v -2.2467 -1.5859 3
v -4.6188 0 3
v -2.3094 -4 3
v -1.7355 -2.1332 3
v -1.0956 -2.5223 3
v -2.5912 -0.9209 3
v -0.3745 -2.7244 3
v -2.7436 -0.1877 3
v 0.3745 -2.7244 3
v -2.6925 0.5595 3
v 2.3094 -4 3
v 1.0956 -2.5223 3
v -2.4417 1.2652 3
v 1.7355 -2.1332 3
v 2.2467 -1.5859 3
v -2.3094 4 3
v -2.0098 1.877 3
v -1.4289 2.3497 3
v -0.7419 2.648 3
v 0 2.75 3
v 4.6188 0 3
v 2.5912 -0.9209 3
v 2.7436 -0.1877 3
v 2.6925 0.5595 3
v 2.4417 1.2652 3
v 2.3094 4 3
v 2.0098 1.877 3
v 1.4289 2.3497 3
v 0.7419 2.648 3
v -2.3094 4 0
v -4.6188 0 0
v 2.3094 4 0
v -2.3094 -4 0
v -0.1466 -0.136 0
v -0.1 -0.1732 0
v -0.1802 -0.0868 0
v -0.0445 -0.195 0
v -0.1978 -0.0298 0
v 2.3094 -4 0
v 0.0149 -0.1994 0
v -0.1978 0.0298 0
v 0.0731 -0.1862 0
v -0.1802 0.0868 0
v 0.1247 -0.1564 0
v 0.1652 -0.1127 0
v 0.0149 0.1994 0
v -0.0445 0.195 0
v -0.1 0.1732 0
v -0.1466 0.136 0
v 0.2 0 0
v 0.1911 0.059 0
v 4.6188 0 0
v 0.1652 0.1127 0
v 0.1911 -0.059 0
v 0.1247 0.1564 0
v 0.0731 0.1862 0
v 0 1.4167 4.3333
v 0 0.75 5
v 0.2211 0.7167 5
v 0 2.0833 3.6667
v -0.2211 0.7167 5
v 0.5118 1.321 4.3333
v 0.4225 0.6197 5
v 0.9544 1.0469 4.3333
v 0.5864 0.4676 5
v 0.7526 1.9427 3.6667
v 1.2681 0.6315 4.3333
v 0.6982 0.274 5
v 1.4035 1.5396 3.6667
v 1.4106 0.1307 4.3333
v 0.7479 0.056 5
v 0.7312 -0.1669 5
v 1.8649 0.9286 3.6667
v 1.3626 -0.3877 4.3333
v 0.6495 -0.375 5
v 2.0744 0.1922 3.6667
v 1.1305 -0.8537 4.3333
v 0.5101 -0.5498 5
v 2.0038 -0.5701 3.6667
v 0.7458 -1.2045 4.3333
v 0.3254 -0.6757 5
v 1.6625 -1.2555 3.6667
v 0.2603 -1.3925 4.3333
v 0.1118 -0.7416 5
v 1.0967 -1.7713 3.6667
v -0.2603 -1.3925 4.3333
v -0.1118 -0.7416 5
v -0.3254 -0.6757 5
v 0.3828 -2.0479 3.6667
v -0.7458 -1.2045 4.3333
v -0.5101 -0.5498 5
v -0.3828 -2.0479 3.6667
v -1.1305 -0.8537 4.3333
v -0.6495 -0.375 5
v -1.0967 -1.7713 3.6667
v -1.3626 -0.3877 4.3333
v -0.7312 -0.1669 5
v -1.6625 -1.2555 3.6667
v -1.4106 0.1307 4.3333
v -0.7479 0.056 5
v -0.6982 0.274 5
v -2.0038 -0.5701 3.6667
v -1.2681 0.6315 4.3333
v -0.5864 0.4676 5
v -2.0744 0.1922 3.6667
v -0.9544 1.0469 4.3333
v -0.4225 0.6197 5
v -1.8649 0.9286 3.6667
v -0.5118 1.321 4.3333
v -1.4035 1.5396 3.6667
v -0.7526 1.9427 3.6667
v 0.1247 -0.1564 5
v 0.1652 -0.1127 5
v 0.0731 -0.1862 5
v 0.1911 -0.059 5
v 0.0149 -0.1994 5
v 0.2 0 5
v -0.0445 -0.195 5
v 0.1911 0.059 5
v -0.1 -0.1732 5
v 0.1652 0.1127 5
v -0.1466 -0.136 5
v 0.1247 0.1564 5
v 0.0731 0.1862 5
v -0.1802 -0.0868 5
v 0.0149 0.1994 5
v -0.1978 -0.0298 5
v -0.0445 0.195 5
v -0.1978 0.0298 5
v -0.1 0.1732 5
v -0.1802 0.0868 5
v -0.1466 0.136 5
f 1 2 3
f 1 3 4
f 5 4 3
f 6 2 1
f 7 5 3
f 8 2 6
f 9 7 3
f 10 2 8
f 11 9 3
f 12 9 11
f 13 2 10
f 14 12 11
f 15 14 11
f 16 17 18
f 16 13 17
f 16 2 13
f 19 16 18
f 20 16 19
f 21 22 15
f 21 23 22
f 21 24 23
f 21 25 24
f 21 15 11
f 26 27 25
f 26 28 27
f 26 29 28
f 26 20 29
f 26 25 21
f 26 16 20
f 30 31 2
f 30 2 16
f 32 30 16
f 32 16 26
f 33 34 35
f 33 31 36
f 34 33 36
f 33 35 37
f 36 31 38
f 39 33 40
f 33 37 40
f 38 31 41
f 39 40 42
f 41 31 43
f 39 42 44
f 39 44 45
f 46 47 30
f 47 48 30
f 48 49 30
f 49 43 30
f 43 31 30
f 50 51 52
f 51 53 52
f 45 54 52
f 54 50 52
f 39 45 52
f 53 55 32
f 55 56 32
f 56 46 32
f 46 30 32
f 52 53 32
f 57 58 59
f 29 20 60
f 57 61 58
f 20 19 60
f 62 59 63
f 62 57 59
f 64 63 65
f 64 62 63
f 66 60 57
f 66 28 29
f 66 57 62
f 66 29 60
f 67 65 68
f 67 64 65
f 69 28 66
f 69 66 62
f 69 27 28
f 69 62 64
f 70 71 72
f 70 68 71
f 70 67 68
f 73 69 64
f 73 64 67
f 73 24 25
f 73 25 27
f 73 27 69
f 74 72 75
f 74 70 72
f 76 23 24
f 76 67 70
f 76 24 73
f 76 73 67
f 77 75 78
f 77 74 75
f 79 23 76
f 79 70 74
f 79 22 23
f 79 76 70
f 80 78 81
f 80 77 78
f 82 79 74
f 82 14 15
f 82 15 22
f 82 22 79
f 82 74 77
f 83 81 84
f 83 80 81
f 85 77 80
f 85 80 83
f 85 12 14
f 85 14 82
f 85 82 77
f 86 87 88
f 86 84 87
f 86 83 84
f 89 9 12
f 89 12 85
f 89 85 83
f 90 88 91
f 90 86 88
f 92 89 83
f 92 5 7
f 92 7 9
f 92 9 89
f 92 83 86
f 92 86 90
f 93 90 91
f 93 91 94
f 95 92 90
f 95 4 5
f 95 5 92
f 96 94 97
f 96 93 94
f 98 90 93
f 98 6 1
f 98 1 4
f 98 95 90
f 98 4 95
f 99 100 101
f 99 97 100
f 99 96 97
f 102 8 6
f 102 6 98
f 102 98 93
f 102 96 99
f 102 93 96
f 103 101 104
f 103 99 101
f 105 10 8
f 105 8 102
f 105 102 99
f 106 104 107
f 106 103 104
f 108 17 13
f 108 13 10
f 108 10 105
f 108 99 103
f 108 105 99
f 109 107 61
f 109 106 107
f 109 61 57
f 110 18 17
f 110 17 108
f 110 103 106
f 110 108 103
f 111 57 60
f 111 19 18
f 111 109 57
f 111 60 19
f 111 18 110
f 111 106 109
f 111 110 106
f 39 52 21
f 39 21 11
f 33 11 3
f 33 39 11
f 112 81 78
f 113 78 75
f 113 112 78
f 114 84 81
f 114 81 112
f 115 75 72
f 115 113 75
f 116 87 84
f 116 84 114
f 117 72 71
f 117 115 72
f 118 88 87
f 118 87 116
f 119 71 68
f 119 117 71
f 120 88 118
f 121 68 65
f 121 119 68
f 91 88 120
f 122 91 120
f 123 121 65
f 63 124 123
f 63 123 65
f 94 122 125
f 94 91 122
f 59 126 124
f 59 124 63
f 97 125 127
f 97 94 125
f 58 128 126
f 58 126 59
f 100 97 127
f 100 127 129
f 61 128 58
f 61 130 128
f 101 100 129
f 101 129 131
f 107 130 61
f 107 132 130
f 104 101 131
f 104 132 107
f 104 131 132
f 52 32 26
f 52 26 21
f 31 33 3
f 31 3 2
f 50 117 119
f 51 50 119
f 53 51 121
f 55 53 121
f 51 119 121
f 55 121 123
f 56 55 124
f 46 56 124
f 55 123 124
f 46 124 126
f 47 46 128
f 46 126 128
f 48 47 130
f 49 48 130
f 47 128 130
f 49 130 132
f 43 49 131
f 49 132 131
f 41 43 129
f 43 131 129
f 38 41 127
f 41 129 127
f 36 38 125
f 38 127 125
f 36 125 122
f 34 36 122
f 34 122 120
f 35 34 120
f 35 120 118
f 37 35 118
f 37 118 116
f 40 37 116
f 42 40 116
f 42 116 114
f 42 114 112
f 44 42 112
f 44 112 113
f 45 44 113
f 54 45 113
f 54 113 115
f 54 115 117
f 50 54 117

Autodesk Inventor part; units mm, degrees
ref_plane "XZ Plane" through (0, 0, 0) normal (0, 1, 0) x (-1, 0, 0)
ref_plane "XY Plane" through (0, 0, 0) normal (0, 0, 1) x (1, 0, 0)
sketch "Sketch1" plane through (0, 0, 0) normal (0, 0, 1) x (1, 0, 0)
  line L0 (2.3094, 4) -> (4.6188, 0)
  line L1 (4.6188, 0) -> (2.3094, -4)
  line L2 (2.3094, -4) -> (-2.3094, -4)
  line L3 (-2.3094, -4) -> (-4.6188, 0)
  line L4 (-4.6188, 0) -> (-2.3094, 4)
  line L5 (-2.3094, 4) -> (2.3094, 4)
  point P0 (0, 0)
  point P1 (0, 0)
  dimension "d0" = 8
extrude "Extrusion1" add sketch "Sketch1" along normal blind 3
ref_plane "Work Plane1" through (0, 0, 0) normal (1, 0, 0) x (0, 1, 0)
sketch "Sketch2" plane through (0, 0, 0) normal (1, 0, 0) x (0, 1, 0)
  line L0 (0, 0) -> (-4, 0) projected
  line L1 (0, 0) -> (0, 3) projected
  line L2 (-4, 3) -> (0, 3) projected
  line L3 (-4, 0) -> (-4, 3) projected
  line L4 (4, 0) -> (0, 0) projected
  line L5 (4, 0) -> (4, 3) projected
  line L6 (0, 3) -> (4, 3) projected
  line L7 (0, 0) -> (0, 3) projected
  line L8 (0, 3) -> (0, 5)
  line L9 (0, 5) -> (0.75, 5)
  line L10 (0.75, 5) -> (2.75, 3)
  line L11 (0, 3) -> (2.75, 3)
  point P0 (0, 0)
  dimension "d4" = 2
  dimension "d5" = 0.75
  dimension "d6" = 2.75
revolve "Revolution1" add sketch "Sketch2" angle 360 about axis through (0, 0, 3) along (0, 0, 1) contours L8 L9 L10 L6
sketch "Sketch3" plane through (0, 0, 5) normal (0, 0, 1) x (1, 0, 0)
  circle A0 centre (0, 0) radius 0.75 projected
  circle A1 centre (0, 0) radius 0.2
  dimension "d8" = 0.4
extrude "Extrusion2" cut sketch "Sketch3" against normal through all contours A1
properties part number "nozzle" material "Brass, Soft Yellow"
